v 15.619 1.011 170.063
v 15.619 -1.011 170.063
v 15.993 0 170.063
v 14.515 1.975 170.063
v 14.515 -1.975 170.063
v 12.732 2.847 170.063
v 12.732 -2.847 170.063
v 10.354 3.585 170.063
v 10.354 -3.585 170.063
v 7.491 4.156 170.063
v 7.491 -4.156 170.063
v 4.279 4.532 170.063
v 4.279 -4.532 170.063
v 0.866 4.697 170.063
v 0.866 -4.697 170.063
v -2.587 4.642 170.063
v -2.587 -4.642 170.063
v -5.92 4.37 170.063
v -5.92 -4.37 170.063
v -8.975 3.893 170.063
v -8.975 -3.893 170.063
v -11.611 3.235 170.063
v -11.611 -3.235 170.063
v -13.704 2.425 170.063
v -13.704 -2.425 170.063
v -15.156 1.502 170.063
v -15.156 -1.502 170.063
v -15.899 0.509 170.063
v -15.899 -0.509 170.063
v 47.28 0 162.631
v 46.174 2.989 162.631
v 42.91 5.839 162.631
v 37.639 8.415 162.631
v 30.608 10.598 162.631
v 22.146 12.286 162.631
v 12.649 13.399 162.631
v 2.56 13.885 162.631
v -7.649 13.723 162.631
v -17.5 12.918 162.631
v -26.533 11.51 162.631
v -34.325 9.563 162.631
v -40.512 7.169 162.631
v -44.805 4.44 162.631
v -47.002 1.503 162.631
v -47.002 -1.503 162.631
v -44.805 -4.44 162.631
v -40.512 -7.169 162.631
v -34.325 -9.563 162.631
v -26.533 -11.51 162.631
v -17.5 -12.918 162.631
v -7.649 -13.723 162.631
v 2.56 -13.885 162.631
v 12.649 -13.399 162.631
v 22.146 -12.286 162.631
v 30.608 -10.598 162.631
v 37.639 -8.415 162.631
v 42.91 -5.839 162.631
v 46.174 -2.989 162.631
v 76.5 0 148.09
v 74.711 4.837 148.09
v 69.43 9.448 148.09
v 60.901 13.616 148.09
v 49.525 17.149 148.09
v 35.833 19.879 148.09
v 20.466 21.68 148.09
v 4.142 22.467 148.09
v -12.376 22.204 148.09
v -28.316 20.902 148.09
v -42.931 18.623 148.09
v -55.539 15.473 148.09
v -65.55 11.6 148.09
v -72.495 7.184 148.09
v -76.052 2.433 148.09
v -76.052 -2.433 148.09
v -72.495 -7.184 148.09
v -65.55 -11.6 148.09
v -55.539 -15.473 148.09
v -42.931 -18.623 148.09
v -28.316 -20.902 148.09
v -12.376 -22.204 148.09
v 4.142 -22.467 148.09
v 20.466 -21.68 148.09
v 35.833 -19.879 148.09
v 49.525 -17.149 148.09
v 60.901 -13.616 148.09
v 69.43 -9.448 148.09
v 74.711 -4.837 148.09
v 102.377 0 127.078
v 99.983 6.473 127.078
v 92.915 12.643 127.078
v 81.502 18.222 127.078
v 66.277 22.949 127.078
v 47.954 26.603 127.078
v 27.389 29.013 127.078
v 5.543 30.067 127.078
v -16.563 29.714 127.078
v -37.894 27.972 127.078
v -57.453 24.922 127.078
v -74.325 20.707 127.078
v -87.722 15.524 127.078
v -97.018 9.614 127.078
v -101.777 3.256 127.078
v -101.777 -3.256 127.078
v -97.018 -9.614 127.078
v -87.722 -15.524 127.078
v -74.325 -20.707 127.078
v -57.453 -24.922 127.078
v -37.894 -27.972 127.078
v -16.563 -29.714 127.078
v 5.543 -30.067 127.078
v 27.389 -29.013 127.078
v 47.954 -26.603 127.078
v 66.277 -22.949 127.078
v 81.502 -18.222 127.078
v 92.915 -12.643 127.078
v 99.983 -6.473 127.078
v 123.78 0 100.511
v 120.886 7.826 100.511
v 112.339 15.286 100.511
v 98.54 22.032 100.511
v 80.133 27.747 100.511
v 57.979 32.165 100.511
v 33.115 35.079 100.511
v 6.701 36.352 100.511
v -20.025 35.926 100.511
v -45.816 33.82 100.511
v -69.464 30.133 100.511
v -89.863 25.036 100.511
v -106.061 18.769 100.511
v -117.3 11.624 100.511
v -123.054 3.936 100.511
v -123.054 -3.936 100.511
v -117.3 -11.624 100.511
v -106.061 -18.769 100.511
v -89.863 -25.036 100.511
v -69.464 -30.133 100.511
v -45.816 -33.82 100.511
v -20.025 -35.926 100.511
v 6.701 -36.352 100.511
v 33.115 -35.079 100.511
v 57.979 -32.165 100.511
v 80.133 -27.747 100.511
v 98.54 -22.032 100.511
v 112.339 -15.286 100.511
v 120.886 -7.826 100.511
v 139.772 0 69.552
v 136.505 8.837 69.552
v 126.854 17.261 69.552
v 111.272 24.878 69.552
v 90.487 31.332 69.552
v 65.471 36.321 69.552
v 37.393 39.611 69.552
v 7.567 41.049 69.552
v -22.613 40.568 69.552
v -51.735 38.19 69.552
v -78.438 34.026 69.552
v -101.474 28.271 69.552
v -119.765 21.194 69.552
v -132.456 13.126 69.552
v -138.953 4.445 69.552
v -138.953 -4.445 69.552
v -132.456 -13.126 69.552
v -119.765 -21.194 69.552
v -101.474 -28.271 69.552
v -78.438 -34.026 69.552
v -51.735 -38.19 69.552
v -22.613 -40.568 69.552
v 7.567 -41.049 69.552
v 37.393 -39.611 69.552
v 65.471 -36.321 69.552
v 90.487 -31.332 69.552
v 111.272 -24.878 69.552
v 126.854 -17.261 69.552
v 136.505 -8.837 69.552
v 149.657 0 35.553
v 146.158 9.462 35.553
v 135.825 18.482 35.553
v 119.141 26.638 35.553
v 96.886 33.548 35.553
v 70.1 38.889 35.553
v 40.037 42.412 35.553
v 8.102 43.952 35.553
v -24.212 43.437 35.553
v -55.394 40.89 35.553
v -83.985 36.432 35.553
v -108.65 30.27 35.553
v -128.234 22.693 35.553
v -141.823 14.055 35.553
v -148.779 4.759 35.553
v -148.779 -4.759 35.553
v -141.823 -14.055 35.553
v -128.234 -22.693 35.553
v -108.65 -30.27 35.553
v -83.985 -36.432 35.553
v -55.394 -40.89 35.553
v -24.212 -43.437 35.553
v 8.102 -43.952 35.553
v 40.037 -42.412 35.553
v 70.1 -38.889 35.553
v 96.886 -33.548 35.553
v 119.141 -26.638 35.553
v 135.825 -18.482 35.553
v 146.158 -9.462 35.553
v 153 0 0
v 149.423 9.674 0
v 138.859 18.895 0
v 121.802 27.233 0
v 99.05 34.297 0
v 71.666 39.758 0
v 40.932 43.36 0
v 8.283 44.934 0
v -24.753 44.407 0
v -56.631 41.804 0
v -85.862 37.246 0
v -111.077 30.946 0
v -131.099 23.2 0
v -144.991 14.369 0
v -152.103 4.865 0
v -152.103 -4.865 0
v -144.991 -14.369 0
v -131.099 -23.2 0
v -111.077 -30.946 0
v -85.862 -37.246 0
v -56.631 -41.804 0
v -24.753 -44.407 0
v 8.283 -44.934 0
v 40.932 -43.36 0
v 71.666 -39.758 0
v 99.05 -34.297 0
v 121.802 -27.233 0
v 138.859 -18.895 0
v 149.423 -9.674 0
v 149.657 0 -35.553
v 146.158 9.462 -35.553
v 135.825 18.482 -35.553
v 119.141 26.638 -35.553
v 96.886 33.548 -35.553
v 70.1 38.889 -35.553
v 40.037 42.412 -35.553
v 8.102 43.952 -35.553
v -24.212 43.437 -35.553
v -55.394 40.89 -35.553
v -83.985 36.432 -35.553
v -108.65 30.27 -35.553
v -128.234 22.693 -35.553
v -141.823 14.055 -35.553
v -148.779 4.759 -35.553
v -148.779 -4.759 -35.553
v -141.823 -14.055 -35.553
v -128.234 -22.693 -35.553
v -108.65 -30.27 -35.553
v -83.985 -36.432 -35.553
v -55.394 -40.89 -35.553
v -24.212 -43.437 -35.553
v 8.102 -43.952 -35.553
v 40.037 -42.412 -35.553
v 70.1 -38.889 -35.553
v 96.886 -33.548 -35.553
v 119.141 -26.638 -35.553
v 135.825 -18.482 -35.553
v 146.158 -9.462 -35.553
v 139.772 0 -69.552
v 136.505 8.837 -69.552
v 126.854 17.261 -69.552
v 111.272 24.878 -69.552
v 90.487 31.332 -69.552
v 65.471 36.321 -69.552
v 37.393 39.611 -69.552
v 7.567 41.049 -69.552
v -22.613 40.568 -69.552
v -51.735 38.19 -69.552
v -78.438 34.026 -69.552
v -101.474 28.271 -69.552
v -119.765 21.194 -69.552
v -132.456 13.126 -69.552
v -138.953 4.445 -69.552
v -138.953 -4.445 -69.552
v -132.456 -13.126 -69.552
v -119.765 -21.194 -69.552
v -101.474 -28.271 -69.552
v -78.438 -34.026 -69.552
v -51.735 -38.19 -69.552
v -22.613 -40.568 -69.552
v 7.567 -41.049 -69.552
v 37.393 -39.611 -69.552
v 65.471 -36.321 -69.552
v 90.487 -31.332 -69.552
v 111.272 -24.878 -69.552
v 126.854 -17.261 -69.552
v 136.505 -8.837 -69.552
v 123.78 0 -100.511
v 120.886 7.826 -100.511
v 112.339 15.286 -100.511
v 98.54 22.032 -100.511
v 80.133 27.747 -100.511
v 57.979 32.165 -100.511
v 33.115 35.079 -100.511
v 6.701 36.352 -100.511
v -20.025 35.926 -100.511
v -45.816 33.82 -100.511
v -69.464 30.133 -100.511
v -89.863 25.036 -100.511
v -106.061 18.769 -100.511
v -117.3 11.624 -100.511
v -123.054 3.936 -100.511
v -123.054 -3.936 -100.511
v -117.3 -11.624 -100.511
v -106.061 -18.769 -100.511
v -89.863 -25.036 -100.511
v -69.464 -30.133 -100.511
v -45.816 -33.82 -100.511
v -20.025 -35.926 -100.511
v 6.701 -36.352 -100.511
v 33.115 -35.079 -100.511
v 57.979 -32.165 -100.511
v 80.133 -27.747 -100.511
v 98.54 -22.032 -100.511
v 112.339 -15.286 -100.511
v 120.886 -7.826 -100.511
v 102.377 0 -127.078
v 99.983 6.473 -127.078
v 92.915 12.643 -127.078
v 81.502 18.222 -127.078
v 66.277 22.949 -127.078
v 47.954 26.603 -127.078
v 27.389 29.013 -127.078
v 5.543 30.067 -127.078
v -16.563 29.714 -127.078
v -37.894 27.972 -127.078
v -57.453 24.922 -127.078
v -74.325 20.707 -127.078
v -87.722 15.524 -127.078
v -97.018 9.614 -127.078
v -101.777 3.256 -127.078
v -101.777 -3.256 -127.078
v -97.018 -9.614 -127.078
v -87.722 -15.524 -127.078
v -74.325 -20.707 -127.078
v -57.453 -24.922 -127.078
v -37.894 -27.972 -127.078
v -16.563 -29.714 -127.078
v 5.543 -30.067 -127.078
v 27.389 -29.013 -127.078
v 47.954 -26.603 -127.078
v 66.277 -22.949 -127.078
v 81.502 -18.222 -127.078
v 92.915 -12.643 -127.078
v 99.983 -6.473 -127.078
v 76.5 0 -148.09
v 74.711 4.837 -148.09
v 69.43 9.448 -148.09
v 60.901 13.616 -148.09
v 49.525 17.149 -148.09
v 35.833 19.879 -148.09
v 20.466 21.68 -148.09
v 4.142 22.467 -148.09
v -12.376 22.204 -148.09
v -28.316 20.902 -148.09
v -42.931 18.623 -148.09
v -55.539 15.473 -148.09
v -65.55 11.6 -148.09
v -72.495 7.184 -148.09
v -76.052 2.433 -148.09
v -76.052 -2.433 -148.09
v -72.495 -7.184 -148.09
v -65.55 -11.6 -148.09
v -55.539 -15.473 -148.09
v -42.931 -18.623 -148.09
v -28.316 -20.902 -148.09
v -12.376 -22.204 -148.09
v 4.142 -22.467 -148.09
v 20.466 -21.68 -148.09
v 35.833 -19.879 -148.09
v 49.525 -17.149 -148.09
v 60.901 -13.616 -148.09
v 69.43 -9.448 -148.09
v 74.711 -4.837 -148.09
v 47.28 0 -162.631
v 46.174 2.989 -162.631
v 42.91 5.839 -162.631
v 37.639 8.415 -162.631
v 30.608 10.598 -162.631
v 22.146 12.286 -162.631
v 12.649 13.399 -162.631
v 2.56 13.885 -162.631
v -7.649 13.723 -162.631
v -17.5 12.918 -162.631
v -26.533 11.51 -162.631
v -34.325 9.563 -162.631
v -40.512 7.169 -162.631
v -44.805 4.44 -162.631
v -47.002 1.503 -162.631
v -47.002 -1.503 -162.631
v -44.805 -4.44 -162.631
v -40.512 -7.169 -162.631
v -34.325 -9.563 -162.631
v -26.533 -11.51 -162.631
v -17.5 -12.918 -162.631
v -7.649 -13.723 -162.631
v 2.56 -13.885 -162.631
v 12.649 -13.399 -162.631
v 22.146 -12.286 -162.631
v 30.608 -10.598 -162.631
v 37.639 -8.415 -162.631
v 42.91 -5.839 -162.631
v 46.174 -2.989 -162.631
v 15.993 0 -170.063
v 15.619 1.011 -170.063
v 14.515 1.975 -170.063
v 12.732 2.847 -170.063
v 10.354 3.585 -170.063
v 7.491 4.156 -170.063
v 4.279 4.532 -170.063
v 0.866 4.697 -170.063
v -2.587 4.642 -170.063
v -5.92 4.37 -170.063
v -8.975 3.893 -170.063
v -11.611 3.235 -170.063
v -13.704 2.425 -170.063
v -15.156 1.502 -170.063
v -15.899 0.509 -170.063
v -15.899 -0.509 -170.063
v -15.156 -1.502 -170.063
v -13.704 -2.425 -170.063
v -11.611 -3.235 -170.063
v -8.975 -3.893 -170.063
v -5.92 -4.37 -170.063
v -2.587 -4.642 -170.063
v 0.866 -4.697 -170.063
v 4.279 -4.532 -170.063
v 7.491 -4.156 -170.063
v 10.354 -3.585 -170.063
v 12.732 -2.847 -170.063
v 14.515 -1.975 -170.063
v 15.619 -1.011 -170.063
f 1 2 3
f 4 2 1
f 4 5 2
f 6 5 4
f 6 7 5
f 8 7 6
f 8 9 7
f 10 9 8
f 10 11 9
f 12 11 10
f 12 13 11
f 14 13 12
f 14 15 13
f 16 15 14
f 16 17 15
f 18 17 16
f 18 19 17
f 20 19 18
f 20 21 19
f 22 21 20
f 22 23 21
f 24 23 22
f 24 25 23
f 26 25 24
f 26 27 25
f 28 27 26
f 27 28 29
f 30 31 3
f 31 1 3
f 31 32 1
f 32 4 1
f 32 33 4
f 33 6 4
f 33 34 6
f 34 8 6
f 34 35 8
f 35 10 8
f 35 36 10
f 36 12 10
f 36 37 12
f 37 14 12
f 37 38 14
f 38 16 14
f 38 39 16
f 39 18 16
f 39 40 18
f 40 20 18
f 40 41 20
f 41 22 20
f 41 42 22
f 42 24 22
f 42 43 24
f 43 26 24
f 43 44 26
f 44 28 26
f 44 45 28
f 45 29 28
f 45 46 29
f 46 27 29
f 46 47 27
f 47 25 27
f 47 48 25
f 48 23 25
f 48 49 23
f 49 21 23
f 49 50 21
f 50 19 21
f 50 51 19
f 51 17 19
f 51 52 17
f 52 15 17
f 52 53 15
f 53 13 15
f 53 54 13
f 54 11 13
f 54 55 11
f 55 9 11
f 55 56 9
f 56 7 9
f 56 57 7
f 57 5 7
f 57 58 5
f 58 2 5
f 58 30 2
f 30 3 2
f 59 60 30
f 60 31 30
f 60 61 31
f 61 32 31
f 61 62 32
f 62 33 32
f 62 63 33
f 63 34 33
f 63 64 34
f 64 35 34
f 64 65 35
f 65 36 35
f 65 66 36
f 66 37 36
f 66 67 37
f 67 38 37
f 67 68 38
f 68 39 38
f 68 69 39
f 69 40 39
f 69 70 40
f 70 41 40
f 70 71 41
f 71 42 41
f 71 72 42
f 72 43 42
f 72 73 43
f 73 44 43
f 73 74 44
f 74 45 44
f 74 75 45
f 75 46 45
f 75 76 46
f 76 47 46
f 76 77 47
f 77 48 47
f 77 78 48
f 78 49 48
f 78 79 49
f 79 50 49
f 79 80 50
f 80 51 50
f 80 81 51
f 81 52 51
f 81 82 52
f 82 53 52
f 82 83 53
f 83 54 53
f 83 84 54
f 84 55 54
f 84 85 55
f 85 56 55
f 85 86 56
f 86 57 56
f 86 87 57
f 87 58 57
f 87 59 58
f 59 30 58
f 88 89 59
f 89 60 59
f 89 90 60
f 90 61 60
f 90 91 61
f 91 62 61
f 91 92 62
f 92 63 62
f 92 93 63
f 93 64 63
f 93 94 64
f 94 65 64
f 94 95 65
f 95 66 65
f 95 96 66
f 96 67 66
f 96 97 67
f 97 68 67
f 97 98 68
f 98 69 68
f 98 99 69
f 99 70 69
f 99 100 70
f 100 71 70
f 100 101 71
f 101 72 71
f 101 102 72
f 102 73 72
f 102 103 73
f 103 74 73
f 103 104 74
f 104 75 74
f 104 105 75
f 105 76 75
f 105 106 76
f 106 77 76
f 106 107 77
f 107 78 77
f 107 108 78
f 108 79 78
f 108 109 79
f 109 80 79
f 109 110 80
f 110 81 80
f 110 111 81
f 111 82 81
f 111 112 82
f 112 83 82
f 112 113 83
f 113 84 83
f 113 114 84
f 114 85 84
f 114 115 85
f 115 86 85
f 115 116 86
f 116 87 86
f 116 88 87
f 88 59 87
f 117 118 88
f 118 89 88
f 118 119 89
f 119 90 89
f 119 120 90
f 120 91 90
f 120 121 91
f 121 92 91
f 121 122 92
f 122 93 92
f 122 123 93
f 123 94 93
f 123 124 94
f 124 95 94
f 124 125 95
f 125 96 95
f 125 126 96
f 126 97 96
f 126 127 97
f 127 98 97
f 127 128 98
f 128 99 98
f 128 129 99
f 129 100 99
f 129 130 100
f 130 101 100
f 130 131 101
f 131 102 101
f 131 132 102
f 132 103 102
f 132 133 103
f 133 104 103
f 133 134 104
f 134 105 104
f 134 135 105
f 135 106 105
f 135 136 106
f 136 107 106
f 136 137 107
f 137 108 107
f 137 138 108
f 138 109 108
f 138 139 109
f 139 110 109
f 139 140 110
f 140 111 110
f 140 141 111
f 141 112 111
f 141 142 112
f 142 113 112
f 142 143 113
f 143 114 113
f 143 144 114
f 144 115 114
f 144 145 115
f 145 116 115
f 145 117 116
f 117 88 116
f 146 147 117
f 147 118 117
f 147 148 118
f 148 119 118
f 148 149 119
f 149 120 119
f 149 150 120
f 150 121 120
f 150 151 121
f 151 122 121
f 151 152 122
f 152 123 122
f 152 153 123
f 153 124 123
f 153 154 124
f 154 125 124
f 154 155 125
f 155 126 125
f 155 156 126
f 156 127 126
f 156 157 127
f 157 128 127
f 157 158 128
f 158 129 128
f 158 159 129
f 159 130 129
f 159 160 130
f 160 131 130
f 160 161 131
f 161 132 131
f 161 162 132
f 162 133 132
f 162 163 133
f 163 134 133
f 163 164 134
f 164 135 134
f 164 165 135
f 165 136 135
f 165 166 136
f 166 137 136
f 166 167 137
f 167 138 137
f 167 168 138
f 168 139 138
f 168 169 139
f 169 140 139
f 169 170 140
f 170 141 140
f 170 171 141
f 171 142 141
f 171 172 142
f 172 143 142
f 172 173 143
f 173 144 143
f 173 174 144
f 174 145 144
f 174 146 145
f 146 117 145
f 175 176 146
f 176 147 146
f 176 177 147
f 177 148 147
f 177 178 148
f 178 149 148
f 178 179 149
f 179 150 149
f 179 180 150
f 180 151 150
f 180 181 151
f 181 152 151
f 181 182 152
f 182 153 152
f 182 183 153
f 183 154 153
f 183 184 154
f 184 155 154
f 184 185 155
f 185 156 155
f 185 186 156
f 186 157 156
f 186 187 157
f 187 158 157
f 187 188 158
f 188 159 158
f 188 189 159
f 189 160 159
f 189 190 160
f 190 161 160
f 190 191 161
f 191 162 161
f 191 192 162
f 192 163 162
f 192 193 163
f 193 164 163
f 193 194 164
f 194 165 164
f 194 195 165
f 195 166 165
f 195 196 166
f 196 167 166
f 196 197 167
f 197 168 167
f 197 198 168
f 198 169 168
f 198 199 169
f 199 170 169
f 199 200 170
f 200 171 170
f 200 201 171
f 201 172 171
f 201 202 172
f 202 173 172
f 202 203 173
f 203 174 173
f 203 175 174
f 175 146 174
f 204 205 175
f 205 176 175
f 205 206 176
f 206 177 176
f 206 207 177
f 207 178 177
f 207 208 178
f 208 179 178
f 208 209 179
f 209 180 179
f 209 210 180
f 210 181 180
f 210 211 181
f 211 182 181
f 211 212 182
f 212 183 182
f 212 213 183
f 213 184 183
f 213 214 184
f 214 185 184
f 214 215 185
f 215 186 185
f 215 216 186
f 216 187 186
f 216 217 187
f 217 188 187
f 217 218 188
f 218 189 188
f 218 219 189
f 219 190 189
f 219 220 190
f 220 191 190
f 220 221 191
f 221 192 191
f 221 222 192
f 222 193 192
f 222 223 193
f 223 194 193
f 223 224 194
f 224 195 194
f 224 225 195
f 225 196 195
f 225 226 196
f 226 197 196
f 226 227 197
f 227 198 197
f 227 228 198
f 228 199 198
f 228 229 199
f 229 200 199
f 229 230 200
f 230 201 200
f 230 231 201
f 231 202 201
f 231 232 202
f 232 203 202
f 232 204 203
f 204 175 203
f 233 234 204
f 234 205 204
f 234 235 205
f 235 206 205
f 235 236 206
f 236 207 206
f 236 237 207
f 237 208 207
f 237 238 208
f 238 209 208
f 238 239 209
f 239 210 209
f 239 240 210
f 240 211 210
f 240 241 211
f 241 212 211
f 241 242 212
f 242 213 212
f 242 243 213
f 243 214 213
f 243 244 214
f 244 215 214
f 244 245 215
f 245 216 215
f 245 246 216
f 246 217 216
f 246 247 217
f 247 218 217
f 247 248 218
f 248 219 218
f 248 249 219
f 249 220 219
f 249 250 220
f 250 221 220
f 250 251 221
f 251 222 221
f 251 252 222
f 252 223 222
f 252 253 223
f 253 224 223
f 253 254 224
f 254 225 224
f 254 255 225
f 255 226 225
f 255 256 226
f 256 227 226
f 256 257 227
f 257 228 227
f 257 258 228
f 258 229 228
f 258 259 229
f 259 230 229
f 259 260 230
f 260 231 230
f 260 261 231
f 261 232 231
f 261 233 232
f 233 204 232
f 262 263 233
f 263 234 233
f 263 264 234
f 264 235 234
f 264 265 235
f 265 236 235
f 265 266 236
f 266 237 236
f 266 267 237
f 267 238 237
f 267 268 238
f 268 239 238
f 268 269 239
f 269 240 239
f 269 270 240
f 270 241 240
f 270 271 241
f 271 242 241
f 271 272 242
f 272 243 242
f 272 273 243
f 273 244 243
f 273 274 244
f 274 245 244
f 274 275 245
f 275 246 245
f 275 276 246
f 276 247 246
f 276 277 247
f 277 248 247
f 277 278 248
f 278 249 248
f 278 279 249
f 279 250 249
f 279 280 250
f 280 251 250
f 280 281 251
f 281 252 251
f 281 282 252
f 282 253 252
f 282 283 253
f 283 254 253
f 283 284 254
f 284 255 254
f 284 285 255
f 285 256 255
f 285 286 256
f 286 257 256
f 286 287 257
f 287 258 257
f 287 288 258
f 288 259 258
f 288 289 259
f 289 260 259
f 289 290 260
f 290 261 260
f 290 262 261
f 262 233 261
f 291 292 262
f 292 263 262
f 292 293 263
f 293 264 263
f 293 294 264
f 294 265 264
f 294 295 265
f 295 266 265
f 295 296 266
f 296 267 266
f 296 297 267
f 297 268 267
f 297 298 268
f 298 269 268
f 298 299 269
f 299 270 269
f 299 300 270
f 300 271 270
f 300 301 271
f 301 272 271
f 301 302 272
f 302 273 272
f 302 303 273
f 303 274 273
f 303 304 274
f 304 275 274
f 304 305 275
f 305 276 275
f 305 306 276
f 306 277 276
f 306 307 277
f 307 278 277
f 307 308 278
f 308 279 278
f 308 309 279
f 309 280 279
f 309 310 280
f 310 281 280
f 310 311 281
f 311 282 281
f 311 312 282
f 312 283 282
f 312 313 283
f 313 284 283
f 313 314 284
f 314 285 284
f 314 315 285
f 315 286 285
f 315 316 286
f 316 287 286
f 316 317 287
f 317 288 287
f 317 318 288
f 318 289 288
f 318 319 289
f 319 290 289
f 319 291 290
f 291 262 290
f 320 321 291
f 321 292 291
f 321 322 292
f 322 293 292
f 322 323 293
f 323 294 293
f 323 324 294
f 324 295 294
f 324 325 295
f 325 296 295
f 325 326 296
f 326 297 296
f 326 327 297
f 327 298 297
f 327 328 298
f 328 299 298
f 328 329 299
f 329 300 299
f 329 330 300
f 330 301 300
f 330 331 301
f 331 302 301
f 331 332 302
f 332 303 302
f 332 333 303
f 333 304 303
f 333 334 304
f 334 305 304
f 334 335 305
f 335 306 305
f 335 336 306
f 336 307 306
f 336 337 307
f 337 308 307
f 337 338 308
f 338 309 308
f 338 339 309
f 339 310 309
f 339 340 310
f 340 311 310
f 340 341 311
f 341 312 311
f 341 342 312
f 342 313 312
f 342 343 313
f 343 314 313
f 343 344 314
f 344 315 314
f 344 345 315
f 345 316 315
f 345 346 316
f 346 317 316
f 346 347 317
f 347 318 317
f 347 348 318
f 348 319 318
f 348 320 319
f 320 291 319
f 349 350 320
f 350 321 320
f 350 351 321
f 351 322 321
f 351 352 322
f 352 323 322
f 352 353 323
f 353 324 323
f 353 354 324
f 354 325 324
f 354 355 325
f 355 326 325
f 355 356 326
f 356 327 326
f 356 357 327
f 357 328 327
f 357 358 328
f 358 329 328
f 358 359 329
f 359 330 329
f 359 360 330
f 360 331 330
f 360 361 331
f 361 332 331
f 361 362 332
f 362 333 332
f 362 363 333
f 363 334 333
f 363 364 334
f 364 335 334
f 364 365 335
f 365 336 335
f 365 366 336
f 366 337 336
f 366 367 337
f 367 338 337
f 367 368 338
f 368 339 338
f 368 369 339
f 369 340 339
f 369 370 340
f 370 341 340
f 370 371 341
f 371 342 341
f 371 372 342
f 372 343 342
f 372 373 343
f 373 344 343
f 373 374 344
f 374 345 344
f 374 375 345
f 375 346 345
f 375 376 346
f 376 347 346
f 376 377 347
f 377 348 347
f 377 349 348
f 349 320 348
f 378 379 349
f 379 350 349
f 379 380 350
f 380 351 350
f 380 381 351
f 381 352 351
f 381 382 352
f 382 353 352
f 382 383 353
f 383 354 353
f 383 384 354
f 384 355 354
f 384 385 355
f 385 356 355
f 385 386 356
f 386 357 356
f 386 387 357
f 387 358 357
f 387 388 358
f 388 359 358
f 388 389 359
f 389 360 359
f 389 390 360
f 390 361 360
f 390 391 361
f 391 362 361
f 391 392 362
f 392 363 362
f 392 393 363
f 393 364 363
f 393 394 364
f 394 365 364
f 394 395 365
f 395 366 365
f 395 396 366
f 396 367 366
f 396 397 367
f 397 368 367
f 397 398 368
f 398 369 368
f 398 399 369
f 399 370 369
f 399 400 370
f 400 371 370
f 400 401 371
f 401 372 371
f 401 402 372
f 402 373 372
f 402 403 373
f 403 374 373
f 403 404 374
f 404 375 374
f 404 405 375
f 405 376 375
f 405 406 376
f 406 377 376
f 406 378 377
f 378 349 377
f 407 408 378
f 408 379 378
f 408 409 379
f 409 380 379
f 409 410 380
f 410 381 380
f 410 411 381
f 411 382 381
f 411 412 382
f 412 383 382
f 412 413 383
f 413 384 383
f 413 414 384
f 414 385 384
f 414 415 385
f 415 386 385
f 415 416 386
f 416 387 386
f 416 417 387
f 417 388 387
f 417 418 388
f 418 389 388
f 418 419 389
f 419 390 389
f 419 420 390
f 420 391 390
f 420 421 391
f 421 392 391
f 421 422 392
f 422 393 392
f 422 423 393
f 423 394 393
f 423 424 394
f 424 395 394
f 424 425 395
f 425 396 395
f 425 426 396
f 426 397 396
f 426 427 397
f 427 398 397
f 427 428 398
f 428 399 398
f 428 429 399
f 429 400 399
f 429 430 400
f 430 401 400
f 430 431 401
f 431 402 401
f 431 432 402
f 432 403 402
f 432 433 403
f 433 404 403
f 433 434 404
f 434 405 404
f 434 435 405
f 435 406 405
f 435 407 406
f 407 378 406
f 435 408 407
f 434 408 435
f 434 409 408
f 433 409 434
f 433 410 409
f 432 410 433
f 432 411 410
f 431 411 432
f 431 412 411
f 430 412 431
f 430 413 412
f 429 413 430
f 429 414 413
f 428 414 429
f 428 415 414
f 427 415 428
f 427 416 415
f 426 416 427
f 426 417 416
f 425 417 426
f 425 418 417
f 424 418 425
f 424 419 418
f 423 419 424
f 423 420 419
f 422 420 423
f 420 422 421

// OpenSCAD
// Generated by SolidPython 1.0.1 on 2020-07-29 00:46:52


scale(v = [17, 5, 19]) {
	sphere(r = 9);
}
/***********************************************
*********      SolidPython code:      **********
************************************************
 
# import packages: SolidPython
from solid import *
from solid.utils import *
from itertools import chain, combinations, permutations


class Resize:

    def __init__(self, scad_file):
        self.scad_file = scad_file
        #self.scad_file = import_scad(scad_file)
        # cone/cylinder param:
        self.r1 = 0
        self.r2 = 0
        self.h = 0
        # rectangular prism param:
        self.w = 0
        self.l = 0
        # ellipse param:
        self.r = 0

    # import OpenScad code (file name corresponds to shape)


    # classify shape + parameters
    def assign(self, param1, param2, param3):
        if self.scad_file == 'cone.scad':
            self.r1 = param1
            self.r2 = param2
            self.h = param3
        elif self.scad_file == 'cylinder.scad':
            self.r1 = param1
            self.r2 = param2
            self.h = param3
        elif self.scad_file == 'rectangularPrism.scad':
            self.h = param1
            self.l = param2
            self.w = param3
        else:
            self.r = param1
            self.h = param2

    # resize parameters
    def iterate(self):
        x = range(3, 20, 2)
        i = 1
        if self.scad_file == 'cone.scad':
            tempList = list(permutations(x, 2))
            for temp in tempList:
                param1 = temp[0]
                param2 = temp[1]
                filepath = 'produced_scad_files/' + 'cone' + str(param1) + '_' + str(param2) + '_' + '.scad'
                scad_render_to_file(cylinder(h=param1, r1=param2, r2=0), filepath)

        elif self.scad_file == 'cylinder.scad':
            tempList = list(permutations(x, 3))
            for temp in tempList:
                param1 = temp[0]
                param2 = temp[1]
                filepath = 'produced_scad_files/' + 'cylinder' + str(param1) + '_' + str(param2) + '_' + '.scad'
                scad_render_to_file(cylinder(h=param1, r1=param2, r2=param2), filepath)

        elif self.scad_file == 'rectangularPrism.scad':
            tempList = list(permutations(x, 3))
            for temp in tempList:
                param1 = temp[0]
                param2 = temp[1]
                param3 = temp[2]
                filepath = 'produced_scad_files/' + 'rectangularPrism' + str(param1) + '_' + str(param2) + '_' + str(
                    param3) + '.scad'
                scad_render_to_file(cube(size=(param1, param2, param3)), filepath)

        elif self.scad_file == 'ellipse.scad':
            tempList = list(permutations(x, 4))
            for temp in tempList:
                param1 = temp[0]
                param2 = temp[1]
                param3 = temp[2]
                param4 = temp[3]
                filepath = 'produced_scad_files/' + 'ellipse' + str(param1) + '_' + str(param2) + '_' + str(param3) + '_' + str(param4) + '.scad'
                scad_render_to_file(scale([param1, param2, param3])(sphere(r=param4)), filepath)

    def render_to_scadfile(self):
        scad_render_to_file(scad, 'example.scad') 
 
************************************************/
